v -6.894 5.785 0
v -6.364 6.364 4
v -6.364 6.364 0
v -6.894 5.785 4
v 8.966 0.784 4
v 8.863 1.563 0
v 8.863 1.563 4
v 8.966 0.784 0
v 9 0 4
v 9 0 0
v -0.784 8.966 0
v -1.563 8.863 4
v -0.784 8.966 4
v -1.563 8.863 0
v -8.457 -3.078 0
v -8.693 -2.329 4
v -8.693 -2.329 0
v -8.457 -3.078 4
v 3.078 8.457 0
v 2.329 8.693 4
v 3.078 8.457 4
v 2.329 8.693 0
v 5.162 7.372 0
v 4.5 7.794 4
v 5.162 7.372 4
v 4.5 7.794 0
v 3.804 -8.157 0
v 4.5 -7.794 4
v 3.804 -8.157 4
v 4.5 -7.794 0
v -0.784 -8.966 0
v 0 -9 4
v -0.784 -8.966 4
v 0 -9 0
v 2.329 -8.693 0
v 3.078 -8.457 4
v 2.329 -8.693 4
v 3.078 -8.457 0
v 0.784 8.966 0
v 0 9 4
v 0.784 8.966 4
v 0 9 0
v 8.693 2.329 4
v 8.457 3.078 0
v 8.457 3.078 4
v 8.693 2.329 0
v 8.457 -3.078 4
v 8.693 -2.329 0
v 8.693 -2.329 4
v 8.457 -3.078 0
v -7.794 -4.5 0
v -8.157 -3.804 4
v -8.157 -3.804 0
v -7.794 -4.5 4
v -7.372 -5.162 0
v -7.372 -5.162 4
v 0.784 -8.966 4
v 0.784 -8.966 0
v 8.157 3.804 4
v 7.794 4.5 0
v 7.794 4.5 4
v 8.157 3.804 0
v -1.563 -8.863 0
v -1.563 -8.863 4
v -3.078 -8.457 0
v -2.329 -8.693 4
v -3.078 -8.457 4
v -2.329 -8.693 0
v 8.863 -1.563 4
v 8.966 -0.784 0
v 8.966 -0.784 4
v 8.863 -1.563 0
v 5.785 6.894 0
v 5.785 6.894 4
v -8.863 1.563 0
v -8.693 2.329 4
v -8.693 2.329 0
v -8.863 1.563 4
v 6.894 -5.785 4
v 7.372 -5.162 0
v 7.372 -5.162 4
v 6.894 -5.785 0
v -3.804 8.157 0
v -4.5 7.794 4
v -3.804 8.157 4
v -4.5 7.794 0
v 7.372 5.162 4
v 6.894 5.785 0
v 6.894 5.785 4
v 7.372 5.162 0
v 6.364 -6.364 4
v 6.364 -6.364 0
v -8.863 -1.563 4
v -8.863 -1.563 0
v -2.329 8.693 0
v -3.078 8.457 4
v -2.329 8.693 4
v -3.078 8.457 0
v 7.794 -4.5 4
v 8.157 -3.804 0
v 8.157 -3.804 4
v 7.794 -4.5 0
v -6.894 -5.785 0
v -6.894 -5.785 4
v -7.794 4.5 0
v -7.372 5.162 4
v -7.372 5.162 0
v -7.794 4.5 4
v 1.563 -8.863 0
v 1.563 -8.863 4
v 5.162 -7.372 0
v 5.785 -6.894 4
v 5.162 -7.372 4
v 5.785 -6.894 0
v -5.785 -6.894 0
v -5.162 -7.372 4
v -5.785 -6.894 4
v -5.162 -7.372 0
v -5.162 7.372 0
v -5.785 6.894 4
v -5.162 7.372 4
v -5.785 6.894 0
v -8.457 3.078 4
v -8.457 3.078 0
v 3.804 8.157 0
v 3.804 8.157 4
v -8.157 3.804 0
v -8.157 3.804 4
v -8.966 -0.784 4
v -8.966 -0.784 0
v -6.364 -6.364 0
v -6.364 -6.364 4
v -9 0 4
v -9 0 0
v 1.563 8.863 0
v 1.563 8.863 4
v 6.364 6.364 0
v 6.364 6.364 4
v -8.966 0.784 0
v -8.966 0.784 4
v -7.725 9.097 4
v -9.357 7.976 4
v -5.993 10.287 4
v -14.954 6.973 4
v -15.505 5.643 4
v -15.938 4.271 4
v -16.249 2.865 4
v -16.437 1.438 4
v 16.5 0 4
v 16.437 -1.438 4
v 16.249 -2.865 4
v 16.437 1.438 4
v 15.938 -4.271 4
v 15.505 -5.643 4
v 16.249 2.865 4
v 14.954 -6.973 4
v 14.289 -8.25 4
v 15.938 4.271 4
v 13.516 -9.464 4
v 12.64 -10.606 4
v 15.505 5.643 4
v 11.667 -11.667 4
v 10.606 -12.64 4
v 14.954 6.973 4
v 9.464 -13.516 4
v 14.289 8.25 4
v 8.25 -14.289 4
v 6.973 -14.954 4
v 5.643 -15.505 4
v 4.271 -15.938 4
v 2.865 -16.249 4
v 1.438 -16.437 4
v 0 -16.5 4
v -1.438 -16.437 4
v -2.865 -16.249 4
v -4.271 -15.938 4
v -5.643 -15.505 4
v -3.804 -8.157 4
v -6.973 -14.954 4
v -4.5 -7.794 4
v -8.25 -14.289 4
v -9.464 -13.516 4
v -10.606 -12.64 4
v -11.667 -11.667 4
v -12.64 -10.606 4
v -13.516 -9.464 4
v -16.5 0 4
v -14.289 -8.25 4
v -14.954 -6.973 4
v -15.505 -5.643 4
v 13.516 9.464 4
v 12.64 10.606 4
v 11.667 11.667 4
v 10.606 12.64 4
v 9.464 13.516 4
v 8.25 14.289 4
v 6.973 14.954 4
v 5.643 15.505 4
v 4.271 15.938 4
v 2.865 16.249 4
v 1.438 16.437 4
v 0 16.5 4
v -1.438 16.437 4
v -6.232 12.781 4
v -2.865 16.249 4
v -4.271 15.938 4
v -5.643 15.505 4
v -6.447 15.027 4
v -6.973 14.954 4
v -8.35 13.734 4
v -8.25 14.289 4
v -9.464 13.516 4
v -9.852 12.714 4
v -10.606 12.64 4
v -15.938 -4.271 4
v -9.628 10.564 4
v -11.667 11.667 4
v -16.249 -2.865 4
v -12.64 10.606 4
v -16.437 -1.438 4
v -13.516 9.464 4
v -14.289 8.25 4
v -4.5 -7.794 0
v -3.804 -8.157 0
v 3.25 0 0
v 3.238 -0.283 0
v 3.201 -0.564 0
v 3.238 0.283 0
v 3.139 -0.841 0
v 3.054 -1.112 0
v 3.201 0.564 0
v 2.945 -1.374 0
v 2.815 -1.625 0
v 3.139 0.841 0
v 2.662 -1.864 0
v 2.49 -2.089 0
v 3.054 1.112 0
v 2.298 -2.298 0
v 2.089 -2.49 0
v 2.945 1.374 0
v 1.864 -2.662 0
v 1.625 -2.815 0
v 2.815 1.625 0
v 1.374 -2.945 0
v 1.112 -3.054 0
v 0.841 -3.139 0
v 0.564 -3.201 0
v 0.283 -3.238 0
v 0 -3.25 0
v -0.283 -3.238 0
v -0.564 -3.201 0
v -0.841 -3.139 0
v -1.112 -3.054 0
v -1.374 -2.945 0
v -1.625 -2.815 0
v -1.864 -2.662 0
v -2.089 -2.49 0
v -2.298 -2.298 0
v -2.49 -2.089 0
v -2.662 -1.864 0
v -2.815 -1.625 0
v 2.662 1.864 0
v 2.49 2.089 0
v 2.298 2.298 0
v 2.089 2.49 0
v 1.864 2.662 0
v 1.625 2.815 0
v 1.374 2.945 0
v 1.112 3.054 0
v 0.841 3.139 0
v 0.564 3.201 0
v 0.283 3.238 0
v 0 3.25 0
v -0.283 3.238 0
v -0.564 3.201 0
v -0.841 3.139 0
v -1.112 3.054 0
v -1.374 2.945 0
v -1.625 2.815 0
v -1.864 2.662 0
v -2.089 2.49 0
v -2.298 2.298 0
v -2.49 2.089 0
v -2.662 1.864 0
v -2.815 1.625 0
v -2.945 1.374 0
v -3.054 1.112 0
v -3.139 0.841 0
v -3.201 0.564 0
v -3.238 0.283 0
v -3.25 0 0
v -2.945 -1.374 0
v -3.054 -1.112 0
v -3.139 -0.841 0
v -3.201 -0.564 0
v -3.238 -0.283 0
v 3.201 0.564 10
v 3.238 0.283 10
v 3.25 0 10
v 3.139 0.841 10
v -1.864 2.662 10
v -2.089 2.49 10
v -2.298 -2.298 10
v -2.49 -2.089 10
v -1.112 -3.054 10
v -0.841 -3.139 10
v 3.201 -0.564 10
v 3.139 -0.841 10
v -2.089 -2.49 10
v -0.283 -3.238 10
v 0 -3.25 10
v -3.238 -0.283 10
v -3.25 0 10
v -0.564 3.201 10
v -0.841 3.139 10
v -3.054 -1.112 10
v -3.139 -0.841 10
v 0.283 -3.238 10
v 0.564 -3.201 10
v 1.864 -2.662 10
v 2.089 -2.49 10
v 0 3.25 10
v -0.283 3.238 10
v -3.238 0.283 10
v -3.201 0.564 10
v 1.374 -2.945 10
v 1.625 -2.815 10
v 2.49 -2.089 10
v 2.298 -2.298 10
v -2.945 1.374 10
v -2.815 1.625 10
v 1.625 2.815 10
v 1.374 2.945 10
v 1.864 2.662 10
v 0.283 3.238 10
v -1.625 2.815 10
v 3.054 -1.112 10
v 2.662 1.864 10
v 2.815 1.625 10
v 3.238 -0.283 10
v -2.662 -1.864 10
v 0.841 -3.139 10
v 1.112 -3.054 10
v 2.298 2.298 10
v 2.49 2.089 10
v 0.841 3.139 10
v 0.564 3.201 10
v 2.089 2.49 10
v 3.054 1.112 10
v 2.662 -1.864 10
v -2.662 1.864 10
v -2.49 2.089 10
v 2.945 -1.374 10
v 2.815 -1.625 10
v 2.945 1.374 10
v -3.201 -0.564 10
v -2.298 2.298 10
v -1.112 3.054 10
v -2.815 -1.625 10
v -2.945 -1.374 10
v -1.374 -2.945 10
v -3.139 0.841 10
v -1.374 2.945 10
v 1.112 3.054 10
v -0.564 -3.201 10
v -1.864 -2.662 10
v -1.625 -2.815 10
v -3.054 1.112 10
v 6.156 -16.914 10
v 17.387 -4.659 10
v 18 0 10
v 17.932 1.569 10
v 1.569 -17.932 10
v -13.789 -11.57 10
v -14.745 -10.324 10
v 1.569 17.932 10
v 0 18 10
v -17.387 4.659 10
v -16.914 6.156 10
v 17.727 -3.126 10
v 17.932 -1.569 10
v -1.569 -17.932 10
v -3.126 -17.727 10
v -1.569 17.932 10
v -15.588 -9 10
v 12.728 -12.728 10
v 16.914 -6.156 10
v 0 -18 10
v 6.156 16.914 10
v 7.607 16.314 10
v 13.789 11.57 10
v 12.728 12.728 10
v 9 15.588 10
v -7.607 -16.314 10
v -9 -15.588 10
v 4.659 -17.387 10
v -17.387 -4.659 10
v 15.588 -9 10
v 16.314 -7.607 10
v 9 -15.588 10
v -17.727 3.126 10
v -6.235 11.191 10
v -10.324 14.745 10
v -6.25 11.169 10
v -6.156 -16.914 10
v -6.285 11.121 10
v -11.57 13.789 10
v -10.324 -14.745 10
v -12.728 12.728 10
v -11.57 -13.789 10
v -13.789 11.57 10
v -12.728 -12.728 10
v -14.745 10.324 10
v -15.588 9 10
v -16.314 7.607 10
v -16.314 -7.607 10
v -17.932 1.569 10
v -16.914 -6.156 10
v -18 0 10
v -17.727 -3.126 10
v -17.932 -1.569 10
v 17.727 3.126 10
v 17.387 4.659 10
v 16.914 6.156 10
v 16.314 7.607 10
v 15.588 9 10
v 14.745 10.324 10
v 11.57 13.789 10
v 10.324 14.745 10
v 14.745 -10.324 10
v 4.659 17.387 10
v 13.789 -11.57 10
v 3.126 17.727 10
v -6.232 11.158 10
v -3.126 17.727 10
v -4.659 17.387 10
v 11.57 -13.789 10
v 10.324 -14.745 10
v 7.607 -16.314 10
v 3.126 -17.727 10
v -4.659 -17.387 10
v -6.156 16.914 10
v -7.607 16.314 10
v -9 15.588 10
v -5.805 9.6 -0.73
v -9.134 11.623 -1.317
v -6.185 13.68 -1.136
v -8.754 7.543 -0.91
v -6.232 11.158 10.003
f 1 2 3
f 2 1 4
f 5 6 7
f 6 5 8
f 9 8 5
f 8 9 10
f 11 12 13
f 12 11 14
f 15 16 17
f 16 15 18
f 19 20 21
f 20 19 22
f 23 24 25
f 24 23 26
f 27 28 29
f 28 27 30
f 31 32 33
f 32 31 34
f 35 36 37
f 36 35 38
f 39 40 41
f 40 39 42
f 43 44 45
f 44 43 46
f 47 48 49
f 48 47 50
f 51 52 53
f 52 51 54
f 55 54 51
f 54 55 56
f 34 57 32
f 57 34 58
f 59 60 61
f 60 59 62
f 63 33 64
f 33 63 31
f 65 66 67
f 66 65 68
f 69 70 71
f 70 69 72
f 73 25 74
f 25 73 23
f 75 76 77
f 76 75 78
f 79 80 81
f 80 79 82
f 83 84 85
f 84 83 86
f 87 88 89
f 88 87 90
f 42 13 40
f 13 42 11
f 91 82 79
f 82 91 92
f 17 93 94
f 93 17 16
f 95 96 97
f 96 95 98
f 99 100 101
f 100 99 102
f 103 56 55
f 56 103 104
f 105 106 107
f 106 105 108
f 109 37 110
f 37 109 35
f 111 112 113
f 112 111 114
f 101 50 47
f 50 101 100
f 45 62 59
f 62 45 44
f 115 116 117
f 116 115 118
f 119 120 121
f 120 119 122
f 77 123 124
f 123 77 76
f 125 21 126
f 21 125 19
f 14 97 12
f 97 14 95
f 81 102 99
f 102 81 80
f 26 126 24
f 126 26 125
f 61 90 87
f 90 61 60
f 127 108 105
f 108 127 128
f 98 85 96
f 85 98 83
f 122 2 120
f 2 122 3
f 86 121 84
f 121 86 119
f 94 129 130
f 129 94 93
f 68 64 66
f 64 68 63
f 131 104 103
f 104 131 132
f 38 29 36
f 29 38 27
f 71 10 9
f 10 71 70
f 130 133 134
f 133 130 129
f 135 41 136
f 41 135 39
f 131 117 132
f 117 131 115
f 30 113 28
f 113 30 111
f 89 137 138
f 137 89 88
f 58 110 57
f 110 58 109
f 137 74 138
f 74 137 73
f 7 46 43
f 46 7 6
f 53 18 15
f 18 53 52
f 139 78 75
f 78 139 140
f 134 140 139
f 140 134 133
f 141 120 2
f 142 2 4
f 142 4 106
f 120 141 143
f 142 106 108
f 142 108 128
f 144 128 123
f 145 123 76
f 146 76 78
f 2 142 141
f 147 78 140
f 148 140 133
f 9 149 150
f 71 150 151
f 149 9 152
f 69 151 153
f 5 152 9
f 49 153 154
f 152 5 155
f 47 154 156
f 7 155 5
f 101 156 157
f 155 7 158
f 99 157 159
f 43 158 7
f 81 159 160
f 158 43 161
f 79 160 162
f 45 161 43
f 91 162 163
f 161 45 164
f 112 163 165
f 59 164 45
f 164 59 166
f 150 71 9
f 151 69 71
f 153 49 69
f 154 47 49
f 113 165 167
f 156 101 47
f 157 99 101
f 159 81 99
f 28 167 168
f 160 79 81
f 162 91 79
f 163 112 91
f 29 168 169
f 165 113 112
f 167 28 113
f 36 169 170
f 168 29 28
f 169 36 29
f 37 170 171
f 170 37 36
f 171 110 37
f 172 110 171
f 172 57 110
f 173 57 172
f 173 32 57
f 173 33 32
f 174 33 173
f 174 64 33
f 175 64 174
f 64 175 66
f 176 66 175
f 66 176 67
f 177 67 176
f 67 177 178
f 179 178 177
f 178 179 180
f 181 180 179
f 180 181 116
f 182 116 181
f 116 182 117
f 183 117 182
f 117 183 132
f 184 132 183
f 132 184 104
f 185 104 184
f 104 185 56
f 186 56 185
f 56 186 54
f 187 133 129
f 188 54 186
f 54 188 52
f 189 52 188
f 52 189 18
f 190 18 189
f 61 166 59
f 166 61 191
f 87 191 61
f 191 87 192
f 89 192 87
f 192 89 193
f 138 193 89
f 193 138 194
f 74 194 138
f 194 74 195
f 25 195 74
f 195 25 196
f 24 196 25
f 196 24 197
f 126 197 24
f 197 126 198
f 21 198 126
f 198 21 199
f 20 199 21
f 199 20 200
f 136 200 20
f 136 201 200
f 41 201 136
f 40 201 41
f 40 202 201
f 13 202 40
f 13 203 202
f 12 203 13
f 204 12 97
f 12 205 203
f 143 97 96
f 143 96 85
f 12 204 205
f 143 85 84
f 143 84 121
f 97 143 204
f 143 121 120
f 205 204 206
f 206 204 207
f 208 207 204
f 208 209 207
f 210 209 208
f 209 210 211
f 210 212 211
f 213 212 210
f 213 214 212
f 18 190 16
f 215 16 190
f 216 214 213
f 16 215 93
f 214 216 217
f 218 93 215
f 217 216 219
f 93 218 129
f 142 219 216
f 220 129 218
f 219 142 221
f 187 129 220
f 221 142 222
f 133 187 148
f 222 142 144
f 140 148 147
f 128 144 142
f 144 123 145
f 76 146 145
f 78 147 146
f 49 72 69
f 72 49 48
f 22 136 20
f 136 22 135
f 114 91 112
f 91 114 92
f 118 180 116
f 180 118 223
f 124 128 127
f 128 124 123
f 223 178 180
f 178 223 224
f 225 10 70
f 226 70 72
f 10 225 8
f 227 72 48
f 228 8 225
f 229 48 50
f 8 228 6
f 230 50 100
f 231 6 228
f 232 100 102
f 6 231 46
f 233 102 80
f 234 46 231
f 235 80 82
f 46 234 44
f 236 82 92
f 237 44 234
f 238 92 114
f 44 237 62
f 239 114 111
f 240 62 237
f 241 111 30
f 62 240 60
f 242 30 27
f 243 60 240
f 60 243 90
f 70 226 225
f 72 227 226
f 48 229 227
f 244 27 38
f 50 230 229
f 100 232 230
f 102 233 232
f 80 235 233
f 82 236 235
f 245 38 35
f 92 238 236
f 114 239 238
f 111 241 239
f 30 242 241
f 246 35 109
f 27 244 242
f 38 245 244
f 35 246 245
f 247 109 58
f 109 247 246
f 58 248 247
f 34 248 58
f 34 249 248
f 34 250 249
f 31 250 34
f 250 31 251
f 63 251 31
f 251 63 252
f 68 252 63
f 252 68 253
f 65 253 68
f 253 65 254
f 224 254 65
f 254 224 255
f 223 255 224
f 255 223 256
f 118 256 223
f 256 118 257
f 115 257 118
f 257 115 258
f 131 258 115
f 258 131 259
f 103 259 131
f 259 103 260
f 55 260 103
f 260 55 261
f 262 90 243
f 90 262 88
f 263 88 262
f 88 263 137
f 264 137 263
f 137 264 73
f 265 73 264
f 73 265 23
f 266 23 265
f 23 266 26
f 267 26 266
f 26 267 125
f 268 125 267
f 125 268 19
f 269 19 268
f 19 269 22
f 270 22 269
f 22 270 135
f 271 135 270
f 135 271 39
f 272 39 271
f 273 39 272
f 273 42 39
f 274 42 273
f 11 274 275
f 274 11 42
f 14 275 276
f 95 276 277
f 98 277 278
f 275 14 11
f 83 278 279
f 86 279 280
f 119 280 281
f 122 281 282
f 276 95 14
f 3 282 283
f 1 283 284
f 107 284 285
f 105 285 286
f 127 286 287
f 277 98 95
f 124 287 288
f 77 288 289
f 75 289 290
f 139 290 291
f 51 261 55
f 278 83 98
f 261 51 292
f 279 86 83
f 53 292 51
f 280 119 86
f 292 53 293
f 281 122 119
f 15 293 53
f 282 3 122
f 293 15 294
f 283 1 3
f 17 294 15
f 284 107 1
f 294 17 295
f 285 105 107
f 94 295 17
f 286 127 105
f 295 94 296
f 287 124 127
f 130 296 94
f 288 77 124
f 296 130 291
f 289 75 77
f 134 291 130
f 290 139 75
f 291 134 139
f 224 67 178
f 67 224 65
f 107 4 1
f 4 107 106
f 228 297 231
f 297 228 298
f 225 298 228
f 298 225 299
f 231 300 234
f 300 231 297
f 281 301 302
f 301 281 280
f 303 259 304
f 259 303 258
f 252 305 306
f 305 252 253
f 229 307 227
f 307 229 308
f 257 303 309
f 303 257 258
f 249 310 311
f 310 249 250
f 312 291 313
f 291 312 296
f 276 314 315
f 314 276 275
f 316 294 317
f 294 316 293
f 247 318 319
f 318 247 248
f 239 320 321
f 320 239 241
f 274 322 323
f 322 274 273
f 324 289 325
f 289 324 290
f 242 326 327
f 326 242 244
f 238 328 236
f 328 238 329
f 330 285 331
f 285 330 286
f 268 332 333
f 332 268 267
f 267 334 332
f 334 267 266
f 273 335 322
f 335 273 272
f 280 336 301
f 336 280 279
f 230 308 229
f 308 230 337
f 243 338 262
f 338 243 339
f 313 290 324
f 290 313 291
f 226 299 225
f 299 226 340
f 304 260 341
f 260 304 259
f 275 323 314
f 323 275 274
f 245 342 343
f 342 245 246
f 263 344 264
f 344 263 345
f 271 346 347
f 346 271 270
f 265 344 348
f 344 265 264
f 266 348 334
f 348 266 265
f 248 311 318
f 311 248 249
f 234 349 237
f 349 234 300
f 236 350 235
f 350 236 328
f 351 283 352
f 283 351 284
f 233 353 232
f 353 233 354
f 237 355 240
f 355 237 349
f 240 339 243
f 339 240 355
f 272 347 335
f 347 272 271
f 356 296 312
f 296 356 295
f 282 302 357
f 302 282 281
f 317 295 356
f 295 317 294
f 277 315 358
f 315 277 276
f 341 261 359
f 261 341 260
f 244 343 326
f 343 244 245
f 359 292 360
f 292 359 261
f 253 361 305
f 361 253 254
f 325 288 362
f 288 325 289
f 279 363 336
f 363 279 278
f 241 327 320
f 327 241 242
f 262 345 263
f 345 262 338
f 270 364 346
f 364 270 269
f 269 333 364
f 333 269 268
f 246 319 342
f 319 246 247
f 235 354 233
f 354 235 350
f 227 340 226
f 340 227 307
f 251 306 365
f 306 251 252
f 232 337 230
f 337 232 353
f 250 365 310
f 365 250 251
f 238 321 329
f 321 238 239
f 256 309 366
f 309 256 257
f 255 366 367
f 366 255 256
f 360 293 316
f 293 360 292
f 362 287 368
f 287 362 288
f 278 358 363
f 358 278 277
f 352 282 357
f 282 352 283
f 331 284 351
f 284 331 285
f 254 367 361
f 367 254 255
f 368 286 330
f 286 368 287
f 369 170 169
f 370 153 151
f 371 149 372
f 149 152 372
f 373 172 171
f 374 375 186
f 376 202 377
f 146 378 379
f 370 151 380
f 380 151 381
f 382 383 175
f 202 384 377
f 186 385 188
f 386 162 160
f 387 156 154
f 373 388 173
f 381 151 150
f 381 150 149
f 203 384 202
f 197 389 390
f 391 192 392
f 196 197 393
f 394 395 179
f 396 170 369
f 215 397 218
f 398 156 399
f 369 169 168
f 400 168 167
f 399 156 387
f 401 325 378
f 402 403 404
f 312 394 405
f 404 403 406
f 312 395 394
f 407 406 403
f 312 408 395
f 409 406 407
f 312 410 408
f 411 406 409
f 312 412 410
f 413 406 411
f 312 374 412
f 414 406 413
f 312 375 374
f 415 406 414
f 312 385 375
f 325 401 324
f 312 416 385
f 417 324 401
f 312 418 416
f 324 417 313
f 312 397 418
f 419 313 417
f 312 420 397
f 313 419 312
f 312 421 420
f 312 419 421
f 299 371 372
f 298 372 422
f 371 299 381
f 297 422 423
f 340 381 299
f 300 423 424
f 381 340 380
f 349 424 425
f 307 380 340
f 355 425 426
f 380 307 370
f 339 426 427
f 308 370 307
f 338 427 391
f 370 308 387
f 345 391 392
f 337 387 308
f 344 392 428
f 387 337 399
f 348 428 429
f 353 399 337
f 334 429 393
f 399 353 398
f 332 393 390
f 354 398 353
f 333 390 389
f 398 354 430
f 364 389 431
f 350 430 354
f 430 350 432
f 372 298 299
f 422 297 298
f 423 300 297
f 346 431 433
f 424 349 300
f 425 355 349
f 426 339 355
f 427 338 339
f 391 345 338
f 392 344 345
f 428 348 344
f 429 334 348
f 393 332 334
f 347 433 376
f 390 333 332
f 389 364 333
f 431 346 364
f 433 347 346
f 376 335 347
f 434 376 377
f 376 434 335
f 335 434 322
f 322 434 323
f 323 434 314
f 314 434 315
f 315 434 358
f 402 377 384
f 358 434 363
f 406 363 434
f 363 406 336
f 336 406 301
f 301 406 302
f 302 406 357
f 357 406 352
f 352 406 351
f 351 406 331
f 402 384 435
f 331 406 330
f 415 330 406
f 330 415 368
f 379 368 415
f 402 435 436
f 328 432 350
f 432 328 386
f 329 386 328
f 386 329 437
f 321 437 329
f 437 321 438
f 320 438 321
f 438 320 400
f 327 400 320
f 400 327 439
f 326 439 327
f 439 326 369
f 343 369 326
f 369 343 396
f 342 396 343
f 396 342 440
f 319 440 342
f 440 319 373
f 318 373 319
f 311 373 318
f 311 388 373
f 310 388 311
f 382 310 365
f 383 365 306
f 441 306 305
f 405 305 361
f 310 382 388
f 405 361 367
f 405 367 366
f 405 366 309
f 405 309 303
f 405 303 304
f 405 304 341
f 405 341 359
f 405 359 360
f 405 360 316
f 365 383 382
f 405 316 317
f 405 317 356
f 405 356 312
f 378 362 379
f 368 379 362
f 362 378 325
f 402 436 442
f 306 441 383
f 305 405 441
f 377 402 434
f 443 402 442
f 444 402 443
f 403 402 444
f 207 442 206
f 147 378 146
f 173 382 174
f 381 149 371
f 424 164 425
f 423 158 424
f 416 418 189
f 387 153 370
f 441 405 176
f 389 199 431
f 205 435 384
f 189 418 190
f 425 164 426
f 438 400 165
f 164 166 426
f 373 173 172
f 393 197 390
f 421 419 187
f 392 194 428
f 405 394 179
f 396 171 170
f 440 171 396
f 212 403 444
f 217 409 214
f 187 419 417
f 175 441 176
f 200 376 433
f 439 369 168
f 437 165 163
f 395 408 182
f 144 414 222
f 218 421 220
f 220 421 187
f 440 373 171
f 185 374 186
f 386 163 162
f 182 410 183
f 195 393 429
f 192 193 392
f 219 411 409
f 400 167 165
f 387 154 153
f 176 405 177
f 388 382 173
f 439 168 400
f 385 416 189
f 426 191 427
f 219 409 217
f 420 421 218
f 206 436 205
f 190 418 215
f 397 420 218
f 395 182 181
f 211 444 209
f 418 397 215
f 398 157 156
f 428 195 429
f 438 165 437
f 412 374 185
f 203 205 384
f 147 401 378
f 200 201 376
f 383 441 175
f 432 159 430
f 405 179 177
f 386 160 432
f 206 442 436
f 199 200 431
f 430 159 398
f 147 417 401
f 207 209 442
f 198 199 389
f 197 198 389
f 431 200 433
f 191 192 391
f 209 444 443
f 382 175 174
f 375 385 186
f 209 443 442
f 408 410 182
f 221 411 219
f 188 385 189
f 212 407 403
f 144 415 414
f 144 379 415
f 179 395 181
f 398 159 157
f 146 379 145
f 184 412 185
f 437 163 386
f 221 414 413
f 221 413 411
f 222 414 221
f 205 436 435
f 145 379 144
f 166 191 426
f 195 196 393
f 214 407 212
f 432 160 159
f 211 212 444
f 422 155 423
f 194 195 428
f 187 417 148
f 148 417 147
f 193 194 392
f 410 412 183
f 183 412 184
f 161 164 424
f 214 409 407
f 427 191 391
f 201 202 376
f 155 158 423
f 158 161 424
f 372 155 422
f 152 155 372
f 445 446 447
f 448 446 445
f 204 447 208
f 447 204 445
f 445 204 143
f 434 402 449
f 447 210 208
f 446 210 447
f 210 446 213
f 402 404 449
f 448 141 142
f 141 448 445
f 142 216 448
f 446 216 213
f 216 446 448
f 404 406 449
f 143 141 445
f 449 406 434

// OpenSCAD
d=2;
w=4*0.9;

module leftholder()
{
linear_extrude(w*3, scale=1.3)
polygon([[0,0],[d,w],[d+w,w],[w,0]]);
}

module rightholder()
{
    mirror()
    leftholder();
}


//rightholder();
$fn=72;
k=18;

module test()
{
translate([14,26,0])
{
    difference()
    {
    cylinder(h=4, d=k);
    
    translate([-k/2,0,0])
    cube([k,k,4]);
    }
}
}

i=6.5;
difference()
{
cylinder(h=4, d=k);
cylinder(h=4, d=i);
}

rotate([-5,-7,0])
translate([-8.8,7.5,0.82])
rotate([0,0,35])
leftholder();

color("green", 0.5)
translate([0,0,4])
difference()
{
cylinder(h=6, r2=18, r1=16.5);
cylinder(h=6, d=i);
}

color("blue", 0.5)
translate([0,0,4])
difference()
{
cylinder(h=6, r=15.5);
cylinder(h=6, d=i);
}
